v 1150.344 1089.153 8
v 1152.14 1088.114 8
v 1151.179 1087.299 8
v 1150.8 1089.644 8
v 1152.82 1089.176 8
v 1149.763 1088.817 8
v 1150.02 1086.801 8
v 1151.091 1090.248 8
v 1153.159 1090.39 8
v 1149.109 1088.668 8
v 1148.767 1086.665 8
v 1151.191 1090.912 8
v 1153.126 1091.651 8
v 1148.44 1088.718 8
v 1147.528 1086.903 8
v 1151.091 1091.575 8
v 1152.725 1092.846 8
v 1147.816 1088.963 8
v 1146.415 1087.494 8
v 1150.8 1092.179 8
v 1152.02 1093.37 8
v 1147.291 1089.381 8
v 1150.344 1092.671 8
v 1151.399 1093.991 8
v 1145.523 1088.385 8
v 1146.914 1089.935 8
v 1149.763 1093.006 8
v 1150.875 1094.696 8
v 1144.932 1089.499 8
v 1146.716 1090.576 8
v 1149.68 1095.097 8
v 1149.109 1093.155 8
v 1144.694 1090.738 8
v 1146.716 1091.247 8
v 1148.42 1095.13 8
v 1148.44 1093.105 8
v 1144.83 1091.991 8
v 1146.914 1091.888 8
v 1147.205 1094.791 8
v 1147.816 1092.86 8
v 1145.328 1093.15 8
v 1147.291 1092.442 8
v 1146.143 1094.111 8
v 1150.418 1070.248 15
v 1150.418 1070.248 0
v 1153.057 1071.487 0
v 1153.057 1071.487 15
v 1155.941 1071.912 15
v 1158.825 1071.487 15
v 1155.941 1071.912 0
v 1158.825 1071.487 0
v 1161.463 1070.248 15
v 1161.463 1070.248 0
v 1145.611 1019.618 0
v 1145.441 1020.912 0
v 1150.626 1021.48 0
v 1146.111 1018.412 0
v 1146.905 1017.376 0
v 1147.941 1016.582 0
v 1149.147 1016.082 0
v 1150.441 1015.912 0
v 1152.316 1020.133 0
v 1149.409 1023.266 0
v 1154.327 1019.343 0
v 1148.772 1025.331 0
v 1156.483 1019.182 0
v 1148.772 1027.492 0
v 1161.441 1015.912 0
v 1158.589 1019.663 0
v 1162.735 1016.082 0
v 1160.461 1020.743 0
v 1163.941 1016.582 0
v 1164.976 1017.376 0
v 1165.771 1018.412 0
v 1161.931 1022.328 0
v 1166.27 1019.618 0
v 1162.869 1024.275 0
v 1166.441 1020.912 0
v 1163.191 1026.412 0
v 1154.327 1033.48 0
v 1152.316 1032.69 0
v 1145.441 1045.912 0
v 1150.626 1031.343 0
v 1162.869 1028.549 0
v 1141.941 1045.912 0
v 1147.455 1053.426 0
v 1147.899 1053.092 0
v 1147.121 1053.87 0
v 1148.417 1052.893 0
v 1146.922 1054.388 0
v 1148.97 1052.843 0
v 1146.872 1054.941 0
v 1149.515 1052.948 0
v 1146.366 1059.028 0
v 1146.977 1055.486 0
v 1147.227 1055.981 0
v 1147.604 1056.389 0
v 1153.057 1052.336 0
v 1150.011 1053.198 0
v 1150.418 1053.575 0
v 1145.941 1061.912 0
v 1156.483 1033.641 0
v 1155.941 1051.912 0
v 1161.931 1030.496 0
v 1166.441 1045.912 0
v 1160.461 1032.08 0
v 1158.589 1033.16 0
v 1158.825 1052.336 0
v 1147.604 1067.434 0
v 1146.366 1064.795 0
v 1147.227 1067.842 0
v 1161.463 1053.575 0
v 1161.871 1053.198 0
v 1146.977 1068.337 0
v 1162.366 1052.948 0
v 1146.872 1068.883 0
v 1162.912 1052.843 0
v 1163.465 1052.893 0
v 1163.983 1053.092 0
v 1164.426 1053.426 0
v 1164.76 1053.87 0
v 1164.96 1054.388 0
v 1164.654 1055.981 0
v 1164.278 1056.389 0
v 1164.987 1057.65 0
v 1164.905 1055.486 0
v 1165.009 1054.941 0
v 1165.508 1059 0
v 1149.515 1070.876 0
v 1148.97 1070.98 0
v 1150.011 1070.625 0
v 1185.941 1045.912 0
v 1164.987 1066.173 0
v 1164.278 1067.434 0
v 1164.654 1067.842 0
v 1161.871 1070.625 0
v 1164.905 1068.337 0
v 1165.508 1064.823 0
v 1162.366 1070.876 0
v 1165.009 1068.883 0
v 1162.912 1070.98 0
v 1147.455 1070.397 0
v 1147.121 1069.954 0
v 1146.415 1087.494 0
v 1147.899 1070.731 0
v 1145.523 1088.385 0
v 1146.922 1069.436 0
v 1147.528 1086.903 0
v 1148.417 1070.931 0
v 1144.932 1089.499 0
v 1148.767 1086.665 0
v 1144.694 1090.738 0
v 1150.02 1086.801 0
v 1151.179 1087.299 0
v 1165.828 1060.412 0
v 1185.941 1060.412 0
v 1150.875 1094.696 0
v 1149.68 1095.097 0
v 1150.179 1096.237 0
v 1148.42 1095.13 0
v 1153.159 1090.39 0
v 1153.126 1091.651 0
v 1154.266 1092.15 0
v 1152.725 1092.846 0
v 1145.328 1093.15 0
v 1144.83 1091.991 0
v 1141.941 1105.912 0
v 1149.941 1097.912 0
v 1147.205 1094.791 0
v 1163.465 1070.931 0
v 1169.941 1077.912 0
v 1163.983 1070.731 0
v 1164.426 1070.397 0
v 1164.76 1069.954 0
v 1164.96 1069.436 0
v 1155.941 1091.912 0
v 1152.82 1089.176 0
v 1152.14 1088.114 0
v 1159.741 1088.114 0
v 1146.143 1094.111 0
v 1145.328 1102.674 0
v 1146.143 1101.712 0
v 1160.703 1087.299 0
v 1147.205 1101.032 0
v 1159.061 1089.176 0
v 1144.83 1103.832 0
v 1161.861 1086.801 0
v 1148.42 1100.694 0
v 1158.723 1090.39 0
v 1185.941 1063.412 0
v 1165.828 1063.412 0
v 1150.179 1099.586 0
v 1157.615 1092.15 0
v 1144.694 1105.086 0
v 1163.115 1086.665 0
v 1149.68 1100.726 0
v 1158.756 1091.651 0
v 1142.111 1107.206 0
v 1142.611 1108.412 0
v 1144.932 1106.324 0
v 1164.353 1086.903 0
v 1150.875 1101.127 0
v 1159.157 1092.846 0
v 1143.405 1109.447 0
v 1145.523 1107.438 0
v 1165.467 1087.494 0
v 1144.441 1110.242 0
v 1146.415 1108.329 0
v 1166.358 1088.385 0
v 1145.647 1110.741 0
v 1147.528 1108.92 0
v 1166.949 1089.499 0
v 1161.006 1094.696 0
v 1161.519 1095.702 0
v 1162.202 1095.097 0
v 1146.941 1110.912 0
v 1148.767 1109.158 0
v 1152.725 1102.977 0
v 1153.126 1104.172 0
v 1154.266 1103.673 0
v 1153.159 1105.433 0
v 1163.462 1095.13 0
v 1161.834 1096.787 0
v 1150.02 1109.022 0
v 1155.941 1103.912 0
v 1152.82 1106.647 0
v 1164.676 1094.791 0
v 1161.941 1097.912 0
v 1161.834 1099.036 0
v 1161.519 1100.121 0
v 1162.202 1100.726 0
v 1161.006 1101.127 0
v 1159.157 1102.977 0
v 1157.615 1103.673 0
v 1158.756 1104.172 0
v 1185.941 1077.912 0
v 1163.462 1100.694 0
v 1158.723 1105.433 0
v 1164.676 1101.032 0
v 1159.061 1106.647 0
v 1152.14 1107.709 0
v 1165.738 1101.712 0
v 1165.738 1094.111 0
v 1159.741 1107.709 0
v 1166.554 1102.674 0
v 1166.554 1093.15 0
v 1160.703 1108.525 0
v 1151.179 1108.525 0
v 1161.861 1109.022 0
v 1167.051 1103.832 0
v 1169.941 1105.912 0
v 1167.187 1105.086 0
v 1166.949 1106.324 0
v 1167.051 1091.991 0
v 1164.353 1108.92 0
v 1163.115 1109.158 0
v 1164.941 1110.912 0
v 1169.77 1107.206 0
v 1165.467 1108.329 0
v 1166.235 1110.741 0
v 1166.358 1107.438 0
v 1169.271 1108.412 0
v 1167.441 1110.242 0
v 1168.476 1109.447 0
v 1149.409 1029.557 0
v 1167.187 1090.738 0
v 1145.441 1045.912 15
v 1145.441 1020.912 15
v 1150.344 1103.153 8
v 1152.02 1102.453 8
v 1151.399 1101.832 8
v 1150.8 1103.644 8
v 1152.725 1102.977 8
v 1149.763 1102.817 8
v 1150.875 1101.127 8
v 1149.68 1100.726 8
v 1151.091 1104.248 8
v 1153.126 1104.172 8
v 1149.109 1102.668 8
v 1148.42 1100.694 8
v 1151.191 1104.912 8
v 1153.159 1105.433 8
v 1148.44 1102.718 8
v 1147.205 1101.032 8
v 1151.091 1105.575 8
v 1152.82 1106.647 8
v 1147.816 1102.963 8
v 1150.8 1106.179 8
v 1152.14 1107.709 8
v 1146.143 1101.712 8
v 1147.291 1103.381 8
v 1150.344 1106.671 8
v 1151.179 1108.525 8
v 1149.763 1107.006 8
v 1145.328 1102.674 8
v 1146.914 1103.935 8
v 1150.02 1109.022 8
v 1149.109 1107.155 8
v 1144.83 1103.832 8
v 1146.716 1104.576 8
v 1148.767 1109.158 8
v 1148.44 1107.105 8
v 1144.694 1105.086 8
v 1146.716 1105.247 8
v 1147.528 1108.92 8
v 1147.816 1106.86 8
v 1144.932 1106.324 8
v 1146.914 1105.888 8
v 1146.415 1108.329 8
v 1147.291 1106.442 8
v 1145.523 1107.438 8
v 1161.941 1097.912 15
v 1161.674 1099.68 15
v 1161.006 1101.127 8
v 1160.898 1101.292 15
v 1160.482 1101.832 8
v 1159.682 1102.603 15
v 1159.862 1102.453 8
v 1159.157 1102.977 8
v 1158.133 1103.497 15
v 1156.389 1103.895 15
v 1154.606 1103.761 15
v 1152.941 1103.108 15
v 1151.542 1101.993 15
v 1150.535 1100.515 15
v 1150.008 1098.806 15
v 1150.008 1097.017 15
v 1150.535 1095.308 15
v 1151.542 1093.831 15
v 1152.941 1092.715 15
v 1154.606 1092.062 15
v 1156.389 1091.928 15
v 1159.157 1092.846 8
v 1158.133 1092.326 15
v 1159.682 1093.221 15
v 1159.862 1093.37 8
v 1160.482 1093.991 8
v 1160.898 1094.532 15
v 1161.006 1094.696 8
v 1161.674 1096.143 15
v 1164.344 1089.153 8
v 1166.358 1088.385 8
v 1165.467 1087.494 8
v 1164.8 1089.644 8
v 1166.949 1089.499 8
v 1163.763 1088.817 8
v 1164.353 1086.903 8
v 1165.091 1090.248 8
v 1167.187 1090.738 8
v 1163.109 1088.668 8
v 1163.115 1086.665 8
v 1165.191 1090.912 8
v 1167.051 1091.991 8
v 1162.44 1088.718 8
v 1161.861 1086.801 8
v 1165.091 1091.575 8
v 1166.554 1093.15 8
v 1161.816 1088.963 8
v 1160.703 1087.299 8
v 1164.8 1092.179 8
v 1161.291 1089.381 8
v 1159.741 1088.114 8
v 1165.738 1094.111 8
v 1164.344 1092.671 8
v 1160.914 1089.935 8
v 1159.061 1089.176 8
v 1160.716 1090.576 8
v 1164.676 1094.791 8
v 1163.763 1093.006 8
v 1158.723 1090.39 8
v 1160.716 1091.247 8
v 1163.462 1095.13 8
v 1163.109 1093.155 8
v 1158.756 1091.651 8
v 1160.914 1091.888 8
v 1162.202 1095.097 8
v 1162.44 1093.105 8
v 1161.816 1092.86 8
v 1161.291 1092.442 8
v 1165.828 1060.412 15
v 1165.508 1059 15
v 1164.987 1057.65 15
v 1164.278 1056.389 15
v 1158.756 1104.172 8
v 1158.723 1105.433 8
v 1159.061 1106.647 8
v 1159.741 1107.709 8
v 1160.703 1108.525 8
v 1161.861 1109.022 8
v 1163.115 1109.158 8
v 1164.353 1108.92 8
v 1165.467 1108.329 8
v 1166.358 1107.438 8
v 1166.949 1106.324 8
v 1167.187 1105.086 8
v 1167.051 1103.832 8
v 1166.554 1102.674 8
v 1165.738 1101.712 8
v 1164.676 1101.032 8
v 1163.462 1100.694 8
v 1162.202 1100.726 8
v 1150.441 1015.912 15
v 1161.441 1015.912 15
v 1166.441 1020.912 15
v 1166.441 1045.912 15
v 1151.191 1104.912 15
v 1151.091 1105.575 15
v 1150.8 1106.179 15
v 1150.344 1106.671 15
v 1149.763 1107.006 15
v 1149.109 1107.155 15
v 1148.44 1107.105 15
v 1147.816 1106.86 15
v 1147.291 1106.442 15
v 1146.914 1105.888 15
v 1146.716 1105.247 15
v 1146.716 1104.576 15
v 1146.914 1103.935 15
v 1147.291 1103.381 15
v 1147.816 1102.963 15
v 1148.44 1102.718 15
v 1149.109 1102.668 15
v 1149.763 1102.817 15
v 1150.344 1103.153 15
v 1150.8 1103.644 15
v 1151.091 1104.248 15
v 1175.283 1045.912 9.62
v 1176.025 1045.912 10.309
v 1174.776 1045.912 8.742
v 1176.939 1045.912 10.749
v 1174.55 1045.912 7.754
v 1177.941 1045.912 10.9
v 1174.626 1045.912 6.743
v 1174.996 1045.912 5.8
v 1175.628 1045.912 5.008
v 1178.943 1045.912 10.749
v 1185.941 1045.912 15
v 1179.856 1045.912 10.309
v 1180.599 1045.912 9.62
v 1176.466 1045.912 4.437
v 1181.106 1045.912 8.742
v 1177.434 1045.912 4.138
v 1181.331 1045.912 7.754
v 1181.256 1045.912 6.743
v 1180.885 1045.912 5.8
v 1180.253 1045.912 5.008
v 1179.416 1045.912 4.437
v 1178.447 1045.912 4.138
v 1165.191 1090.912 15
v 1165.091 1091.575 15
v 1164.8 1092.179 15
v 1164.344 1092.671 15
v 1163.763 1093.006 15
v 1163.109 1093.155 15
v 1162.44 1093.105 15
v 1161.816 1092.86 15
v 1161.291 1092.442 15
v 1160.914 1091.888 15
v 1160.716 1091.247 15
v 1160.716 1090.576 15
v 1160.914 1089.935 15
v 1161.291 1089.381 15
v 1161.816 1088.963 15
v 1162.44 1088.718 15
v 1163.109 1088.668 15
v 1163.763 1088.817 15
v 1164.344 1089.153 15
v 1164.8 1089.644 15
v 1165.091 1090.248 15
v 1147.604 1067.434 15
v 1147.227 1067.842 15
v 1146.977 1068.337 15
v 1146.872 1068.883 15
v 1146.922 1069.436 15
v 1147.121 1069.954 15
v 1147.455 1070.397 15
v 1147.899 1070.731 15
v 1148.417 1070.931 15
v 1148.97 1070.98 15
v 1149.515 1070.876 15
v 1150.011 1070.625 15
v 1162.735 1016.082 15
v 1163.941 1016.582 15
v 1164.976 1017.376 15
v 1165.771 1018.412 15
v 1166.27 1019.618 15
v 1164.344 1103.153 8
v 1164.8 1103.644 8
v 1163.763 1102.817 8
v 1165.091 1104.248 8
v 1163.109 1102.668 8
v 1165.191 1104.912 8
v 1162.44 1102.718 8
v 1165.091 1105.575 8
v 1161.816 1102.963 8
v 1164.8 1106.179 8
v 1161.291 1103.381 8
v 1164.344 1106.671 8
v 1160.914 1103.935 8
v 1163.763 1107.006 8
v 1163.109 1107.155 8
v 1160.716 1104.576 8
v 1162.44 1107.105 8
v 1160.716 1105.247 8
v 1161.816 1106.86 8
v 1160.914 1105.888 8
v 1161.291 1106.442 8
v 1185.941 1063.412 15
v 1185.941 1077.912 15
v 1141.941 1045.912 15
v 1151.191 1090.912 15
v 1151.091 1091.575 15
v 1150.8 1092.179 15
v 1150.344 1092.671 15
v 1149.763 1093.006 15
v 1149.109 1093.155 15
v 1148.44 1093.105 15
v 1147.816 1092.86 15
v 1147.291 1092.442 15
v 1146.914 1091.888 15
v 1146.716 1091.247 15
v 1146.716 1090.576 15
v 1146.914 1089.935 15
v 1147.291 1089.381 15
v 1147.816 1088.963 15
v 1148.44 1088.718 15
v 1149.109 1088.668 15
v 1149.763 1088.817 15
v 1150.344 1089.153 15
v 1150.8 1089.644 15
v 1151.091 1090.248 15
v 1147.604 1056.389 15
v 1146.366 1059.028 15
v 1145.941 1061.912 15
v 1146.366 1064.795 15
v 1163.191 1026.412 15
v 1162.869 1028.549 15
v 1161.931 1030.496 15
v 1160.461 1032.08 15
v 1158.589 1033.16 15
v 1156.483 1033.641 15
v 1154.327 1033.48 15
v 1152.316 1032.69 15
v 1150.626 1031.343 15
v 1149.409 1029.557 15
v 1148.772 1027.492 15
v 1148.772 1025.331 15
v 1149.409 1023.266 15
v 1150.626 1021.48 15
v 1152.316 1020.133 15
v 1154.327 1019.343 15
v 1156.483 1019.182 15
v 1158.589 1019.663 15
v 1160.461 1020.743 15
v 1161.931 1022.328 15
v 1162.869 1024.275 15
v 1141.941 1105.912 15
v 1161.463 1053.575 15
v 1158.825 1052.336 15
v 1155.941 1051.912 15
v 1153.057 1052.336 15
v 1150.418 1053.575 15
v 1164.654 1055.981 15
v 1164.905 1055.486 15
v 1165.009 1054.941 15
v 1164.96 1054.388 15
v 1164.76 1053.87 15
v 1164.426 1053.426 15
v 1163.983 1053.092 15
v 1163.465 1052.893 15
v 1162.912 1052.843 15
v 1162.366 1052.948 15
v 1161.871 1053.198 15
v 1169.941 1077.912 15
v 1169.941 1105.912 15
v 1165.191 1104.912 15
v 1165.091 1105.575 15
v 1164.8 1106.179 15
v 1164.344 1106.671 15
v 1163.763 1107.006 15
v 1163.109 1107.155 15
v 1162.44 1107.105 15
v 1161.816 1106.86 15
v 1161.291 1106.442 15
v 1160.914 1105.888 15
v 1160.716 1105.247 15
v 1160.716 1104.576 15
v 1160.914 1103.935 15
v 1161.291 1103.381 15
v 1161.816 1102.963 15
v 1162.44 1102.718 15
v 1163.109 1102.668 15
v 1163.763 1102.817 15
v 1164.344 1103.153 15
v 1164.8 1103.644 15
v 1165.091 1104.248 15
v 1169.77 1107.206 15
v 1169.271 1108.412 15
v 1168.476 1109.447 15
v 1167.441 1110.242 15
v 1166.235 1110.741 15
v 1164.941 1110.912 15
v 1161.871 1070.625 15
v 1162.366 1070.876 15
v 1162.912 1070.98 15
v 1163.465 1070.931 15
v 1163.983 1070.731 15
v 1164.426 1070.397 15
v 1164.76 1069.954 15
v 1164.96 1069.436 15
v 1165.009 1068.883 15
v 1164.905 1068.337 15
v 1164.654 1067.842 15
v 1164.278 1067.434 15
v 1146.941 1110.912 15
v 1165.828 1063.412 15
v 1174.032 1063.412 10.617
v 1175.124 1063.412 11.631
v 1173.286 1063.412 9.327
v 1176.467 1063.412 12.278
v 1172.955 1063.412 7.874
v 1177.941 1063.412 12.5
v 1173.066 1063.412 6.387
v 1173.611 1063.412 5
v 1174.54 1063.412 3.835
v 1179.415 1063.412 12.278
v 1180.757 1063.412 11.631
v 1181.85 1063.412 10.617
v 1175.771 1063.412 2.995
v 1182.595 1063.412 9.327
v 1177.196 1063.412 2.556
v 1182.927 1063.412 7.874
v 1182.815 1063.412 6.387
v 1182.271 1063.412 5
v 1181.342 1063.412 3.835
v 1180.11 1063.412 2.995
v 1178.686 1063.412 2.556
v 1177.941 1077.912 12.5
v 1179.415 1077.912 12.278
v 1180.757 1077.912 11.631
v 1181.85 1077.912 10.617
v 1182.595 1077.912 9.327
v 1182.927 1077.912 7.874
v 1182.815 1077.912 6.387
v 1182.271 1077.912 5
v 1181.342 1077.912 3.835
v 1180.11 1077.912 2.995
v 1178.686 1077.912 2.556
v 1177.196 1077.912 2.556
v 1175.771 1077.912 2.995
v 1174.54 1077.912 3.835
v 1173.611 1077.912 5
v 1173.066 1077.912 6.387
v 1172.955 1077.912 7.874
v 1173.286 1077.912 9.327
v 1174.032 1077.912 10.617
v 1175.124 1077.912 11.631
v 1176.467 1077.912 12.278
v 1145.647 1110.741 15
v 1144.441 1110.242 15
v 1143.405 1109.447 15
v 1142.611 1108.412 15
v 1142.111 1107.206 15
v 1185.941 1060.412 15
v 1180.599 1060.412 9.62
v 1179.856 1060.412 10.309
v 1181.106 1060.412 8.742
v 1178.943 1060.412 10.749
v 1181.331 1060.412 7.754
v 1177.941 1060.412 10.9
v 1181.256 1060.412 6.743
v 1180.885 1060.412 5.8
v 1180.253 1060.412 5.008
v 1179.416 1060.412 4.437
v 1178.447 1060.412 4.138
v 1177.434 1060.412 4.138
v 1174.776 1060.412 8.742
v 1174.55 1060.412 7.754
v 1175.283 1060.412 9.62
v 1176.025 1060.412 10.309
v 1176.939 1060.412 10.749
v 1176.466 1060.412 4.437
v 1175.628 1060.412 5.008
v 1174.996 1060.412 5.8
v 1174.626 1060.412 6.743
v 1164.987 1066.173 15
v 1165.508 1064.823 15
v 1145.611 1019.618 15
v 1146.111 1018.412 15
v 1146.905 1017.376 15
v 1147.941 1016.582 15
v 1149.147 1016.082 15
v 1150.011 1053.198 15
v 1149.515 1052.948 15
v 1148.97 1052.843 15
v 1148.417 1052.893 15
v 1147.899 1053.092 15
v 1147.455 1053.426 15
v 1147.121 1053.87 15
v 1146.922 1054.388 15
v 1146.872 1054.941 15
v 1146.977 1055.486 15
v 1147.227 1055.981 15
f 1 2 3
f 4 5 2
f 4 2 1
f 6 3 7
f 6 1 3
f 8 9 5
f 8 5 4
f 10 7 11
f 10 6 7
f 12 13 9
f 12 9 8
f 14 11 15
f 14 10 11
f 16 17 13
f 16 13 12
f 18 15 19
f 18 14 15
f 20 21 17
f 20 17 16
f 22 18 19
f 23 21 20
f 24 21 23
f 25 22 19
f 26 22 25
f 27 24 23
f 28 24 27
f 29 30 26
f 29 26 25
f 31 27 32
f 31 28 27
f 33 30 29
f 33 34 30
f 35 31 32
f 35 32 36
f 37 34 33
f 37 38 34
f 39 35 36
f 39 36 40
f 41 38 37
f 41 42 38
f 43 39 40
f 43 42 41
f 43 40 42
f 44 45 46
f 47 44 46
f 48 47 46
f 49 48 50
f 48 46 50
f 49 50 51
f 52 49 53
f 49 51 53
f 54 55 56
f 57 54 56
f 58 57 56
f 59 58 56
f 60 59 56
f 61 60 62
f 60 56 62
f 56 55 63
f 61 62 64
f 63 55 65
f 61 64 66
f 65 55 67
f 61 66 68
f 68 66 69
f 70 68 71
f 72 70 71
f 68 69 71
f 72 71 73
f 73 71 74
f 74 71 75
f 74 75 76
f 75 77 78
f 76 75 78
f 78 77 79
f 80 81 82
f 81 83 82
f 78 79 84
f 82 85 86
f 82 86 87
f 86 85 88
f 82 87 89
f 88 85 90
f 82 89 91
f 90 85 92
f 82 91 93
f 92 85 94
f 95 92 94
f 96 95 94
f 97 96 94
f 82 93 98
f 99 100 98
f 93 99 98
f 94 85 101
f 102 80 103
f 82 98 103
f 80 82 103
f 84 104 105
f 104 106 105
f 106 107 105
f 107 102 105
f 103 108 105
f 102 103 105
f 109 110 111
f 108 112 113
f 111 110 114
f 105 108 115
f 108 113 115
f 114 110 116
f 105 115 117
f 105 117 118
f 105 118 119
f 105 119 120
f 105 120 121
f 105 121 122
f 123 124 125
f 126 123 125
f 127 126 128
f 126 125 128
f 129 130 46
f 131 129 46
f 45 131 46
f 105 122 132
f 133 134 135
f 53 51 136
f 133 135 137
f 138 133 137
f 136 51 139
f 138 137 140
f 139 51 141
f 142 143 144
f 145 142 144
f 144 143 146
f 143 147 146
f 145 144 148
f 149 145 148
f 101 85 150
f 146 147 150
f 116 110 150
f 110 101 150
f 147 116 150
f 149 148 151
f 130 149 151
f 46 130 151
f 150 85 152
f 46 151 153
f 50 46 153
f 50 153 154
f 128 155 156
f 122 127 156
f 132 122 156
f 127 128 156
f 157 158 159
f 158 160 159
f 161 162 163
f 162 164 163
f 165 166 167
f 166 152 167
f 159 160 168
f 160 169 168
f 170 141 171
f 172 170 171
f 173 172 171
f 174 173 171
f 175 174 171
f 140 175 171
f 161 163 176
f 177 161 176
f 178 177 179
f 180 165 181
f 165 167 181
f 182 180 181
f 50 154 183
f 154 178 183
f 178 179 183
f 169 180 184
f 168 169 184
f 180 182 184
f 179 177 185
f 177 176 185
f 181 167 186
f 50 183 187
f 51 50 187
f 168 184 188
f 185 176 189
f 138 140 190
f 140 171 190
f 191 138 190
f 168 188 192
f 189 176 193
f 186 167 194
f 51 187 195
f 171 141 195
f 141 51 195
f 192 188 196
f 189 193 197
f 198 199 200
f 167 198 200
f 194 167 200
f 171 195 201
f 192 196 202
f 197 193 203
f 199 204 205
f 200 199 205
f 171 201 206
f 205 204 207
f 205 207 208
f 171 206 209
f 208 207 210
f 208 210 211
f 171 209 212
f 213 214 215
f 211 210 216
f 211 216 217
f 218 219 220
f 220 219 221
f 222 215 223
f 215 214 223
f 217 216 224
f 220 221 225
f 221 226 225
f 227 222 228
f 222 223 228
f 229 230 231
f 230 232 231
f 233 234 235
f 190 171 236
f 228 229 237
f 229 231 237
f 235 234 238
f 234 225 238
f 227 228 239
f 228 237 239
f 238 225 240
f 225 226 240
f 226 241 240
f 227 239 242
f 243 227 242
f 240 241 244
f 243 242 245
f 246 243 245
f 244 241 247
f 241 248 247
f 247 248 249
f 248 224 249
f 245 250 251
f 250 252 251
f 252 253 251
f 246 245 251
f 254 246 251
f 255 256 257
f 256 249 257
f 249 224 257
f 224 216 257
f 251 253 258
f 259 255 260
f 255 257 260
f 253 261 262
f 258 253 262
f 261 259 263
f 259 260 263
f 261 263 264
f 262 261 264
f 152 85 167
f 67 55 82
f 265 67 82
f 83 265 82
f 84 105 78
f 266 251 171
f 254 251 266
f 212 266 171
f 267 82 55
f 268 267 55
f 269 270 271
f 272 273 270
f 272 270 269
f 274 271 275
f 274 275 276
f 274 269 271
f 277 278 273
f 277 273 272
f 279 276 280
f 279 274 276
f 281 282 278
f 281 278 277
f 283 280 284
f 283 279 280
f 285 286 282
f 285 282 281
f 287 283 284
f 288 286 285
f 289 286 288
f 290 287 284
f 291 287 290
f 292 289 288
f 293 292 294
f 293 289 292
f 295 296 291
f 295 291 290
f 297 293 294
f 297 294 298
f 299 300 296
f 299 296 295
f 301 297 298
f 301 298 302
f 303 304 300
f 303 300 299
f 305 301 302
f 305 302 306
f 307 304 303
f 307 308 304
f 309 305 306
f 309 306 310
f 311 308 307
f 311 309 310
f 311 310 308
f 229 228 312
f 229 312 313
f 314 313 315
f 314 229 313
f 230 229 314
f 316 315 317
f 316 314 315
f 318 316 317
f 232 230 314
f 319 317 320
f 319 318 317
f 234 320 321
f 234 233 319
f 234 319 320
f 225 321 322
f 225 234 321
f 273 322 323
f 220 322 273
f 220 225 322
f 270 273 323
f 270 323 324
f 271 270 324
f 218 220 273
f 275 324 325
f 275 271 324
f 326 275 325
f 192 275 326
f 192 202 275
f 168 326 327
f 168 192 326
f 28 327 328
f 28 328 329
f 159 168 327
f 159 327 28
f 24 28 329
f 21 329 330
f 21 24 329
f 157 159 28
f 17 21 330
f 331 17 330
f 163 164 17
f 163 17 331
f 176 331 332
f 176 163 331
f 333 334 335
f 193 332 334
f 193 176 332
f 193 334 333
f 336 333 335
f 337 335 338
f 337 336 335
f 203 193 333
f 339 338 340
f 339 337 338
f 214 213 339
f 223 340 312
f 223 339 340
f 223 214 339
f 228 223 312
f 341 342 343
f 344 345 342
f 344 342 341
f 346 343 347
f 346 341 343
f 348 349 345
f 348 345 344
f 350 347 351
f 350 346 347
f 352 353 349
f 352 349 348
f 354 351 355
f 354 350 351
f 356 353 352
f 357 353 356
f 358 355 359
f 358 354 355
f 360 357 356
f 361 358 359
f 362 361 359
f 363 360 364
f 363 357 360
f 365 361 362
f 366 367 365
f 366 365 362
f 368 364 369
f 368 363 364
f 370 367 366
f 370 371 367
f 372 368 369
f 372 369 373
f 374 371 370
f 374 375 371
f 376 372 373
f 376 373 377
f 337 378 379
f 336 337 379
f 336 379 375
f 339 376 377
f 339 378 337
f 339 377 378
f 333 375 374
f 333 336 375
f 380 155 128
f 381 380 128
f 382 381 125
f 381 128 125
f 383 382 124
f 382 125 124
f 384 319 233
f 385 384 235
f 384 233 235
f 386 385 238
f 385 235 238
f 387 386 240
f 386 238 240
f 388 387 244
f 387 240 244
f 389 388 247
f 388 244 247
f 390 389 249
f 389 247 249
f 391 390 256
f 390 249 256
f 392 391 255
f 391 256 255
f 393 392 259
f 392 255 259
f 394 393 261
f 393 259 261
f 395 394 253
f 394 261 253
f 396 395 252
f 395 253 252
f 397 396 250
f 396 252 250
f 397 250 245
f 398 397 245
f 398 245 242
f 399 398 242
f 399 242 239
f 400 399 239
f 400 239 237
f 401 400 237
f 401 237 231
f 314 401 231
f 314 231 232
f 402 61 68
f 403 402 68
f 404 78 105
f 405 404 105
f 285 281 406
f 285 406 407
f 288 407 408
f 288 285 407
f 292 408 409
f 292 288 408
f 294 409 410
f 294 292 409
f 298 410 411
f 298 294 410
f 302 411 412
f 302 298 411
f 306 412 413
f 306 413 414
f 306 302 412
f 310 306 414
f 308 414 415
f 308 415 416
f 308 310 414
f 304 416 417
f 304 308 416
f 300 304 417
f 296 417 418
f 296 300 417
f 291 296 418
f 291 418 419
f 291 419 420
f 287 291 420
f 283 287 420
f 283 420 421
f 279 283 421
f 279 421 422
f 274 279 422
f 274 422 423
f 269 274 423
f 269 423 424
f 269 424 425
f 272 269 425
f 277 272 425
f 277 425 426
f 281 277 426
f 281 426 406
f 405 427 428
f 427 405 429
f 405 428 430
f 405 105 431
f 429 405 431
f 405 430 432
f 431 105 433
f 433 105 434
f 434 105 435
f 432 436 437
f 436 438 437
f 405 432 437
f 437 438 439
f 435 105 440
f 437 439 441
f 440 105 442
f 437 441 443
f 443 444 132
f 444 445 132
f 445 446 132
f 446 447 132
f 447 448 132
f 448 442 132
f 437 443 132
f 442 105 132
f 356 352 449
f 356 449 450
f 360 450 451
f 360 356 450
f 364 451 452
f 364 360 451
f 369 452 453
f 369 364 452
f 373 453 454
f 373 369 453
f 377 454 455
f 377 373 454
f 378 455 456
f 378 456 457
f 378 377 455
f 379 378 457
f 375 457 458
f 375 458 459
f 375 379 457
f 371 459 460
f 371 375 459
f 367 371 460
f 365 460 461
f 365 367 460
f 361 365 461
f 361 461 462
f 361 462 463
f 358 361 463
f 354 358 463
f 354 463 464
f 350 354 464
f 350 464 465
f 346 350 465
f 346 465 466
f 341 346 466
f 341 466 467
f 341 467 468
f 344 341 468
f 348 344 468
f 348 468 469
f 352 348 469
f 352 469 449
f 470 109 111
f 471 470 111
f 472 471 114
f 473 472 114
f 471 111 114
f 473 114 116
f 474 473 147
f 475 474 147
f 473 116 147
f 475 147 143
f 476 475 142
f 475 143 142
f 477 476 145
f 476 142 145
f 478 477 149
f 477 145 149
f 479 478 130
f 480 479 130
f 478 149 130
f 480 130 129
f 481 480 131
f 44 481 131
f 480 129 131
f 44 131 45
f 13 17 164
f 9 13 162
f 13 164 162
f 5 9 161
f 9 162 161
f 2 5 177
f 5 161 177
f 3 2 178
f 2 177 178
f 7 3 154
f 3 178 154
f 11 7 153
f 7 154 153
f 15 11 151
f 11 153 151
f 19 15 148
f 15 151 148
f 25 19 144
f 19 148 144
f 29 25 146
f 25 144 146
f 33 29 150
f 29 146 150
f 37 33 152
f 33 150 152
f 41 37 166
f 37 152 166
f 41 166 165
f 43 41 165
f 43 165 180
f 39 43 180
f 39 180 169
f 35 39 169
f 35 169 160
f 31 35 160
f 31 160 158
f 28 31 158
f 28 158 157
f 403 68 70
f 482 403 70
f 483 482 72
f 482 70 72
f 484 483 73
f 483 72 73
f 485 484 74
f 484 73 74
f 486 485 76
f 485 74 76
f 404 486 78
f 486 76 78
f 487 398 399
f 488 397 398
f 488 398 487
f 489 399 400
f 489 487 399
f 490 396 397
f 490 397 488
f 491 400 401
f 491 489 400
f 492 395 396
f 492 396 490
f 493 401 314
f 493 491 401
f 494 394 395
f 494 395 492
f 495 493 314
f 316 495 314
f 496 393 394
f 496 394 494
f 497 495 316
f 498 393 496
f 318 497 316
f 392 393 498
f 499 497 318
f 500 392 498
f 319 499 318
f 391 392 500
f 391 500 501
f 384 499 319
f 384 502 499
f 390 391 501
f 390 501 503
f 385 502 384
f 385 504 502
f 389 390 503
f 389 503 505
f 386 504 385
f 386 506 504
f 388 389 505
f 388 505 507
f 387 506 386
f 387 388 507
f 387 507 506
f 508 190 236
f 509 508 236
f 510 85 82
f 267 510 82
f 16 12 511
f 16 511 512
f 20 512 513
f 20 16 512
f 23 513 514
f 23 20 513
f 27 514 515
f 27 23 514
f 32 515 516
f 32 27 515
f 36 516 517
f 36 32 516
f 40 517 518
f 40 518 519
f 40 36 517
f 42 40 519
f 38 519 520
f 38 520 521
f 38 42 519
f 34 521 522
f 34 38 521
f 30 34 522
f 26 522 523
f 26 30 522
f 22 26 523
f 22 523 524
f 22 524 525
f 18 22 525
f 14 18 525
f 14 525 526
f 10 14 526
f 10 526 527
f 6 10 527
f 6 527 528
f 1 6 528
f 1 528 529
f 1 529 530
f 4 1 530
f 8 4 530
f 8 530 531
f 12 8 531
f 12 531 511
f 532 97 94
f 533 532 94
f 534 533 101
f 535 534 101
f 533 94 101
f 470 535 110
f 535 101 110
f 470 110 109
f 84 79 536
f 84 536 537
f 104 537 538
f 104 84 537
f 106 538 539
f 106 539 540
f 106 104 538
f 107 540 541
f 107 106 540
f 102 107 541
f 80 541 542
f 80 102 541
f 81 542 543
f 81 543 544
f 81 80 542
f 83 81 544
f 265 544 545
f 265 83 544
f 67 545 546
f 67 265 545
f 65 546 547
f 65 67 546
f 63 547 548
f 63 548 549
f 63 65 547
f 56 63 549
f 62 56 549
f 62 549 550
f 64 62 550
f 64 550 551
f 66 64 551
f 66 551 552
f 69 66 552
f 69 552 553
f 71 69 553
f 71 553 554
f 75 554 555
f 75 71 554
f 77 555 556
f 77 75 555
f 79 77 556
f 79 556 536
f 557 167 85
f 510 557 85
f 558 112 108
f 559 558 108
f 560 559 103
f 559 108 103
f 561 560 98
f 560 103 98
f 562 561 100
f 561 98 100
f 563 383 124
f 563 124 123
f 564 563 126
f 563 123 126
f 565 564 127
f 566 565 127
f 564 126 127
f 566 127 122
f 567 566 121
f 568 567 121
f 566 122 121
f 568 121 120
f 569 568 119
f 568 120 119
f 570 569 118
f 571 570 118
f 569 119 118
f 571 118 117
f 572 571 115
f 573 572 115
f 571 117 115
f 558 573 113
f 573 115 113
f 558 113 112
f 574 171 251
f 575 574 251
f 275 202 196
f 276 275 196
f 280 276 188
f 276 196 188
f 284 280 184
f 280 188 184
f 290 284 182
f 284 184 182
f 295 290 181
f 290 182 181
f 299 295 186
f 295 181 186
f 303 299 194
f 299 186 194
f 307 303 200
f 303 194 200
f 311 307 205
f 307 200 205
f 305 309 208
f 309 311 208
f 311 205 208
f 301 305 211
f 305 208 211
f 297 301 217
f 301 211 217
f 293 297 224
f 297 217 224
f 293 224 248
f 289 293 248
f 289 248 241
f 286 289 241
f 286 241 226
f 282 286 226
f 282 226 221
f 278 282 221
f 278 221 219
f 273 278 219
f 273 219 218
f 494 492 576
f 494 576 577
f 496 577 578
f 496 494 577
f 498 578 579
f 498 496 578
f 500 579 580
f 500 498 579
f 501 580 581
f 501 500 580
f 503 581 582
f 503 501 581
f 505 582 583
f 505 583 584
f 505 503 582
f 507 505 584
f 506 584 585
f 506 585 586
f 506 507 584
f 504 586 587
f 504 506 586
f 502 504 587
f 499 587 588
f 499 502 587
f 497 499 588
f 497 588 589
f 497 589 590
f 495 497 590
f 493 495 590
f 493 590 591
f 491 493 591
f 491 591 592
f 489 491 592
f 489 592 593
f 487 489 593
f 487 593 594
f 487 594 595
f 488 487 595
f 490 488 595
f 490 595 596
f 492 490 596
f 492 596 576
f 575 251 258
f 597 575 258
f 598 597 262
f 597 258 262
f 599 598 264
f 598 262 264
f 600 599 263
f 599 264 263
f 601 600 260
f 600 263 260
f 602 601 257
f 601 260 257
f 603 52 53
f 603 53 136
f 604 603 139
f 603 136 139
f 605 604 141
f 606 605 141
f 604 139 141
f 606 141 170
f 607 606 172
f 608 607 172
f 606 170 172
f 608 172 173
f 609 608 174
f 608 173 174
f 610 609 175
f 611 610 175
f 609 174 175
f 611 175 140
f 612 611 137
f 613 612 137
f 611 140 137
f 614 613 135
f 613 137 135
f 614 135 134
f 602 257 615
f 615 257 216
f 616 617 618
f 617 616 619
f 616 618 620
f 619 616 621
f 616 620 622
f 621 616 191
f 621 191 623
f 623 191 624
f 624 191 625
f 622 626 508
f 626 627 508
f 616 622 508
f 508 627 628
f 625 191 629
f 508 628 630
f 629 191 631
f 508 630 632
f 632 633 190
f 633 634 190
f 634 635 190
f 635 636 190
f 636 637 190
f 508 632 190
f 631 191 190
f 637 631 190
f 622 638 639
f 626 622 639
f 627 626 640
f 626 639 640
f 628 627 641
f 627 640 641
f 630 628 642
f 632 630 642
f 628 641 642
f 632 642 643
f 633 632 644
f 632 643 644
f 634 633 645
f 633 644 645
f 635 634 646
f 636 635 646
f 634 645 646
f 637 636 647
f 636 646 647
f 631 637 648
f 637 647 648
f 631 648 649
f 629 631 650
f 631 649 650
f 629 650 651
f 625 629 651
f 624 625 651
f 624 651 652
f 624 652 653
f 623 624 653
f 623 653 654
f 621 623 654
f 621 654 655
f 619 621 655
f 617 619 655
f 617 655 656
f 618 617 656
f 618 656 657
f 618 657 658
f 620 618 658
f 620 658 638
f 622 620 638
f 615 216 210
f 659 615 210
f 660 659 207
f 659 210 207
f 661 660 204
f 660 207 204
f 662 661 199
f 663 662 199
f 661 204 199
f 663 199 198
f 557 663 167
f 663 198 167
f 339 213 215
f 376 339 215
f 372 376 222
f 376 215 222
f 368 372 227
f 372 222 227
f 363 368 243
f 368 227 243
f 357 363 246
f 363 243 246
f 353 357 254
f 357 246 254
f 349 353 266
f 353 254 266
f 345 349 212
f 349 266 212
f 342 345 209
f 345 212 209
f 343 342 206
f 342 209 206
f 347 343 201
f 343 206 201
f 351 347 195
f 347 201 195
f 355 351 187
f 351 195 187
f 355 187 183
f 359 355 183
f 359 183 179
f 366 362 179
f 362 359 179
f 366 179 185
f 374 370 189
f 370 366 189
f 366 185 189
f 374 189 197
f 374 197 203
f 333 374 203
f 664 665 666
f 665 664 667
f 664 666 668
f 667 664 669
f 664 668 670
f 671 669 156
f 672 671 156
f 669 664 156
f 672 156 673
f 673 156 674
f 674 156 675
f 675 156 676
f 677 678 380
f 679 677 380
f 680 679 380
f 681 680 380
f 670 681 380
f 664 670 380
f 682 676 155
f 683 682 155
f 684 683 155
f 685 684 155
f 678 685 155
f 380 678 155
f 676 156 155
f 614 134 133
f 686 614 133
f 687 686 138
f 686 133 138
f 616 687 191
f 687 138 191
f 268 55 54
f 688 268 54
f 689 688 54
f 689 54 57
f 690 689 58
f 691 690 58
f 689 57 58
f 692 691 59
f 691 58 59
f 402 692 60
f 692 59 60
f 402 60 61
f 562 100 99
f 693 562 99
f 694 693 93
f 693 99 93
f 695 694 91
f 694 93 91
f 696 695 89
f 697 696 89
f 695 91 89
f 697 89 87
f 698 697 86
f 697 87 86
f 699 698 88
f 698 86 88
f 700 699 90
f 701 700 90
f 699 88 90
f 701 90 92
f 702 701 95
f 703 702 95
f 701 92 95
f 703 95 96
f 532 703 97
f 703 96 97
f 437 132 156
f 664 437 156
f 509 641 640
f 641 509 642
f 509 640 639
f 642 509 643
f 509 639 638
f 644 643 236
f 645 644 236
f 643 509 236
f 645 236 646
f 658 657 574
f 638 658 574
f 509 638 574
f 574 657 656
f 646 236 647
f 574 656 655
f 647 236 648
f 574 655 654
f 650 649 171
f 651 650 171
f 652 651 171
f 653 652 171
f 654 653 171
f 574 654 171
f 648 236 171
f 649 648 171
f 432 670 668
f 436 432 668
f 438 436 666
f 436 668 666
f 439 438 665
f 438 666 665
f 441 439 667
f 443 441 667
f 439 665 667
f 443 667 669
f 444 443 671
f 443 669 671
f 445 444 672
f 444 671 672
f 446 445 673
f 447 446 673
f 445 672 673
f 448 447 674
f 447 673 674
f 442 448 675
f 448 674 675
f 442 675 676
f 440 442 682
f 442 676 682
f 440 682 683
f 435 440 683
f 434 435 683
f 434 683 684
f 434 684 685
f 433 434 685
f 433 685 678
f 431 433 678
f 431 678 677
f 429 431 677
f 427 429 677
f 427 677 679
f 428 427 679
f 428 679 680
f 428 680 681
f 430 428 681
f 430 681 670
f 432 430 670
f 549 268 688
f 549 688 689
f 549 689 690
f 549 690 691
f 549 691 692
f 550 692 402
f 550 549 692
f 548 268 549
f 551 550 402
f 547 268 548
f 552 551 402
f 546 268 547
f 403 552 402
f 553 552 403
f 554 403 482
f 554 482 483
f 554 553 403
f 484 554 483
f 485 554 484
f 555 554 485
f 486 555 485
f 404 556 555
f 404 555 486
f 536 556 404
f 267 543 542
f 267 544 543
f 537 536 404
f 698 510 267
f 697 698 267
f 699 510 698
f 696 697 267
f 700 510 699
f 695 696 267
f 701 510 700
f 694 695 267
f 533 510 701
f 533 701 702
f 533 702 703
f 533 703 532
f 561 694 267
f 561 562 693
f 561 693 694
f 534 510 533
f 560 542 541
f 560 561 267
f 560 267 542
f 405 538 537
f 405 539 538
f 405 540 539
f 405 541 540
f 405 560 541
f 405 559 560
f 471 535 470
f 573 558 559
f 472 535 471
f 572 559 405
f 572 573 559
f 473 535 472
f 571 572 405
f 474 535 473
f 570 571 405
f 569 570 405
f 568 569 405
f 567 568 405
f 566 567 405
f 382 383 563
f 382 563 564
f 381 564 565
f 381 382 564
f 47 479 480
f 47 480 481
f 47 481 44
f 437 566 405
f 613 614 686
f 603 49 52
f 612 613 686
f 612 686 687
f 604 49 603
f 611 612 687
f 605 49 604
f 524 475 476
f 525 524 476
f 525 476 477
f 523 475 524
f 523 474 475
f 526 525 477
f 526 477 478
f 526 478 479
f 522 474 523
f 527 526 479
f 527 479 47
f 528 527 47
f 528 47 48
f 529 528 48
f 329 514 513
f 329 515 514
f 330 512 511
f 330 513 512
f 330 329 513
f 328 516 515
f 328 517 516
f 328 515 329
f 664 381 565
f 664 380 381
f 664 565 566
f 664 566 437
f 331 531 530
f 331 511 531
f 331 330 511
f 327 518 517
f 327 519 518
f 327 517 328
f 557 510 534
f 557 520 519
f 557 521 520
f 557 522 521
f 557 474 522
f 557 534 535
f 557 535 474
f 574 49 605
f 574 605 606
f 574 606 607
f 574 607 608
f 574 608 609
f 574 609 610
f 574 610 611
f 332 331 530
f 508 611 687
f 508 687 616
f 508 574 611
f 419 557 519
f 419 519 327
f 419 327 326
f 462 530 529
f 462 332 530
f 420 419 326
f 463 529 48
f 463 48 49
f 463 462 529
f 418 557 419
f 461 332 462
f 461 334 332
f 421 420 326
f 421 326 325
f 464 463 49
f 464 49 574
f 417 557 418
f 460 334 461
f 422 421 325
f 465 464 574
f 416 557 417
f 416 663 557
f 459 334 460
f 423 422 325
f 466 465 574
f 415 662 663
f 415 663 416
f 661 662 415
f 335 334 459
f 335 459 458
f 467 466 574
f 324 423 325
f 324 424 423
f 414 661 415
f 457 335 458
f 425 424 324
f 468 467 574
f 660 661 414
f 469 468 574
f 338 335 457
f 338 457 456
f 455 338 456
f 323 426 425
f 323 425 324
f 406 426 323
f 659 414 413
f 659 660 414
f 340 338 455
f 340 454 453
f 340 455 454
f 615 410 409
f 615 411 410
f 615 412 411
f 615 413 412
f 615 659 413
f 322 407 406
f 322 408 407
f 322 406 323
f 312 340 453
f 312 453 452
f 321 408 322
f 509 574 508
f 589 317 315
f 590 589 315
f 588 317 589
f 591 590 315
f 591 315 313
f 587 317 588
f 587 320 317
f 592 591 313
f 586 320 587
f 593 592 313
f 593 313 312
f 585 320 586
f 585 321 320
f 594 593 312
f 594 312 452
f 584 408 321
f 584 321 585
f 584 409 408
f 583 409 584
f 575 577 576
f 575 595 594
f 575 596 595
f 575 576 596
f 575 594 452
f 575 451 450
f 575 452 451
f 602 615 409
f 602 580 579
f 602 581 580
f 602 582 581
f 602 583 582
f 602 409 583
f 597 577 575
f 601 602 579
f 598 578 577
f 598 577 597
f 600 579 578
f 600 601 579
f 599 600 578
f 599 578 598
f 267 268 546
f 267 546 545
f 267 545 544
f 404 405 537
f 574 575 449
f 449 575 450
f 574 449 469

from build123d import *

# Parameters (mm, degrees)
SKETCH_1_R          = 2.25
SKETCH_1_R_2        = 6
SKETCH_1_R_3        = 7.25
EXTRUDE_1_DEPTH     = 15
SKETCH_2_R          = 4.25
CUT_EXTRUDE_2_DEPTH = 8
SKETCH_3_R          = 3.4
CUT_EXTRUDE_3_DEPTH = 1188.655030604
SKETCH_4_R          = 5
CUT_EXTRUDE_4_DEPTH = 15


with BuildPart() as part:
    # 草图1 → 拉伸1 (new body)
    with BuildSketch(Plane.XY):
        with BuildLine():
            Line((1164.940753882, 1110.911631895), (1146.940753882, 1110.911631895))
            ThreePointArc((1146.940753882, 1110.911631895), (1143.405219976, 1109.4471658), (1141.940753882, 1105.911631895))
            Line((1141.940753882, 1105.911631895), (1141.940753882, 1045.911631895))
            Line((1141.940753882, 1045.911631895), (1145.440753882, 1045.911631895))
            Line((1145.440753882, 1045.911631895), (1145.440753882, 1020.911631895))
            ThreePointArc((1145.440753882, 1020.911631895), (1146.905219976, 1017.376097989), (1150.440753882, 1015.911631895))
            Line((1150.440753882, 1015.911631895), (1161.440753882, 1015.911631895))
            ThreePointArc((1161.440753882, 1015.911631895), (1164.976287788, 1017.376097989), (1166.440753882, 1020.911631895))
            Line((1166.440753882, 1020.911631895), (1166.440753882, 1045.911631895))
            Line((1166.440753882, 1045.911631895), (1185.940753882, 1045.911631895))
            Line((1185.940753882, 1045.911631895), (1185.940753882, 1060.411631895))
            Line((1185.940753882, 1060.411631895), (1165.827613848, 1060.411631895))
            ThreePointArc((1165.827613848, 1060.411631895), (1165.271903508, 1058.315850107), (1164.277525065, 1056.389110167))
            ThreePointArc((1164.277525065, 1056.389110167), (1164.426035256, 1053.42635052), (1161.46327561, 1053.574860711))
            ThreePointArc((1161.46327561, 1053.574860711), (1155.940753882, 1051.911631895), (1150.418232154, 1053.574860711))
            ThreePointArc((1150.418232154, 1053.574860711), (1147.455472508, 1053.42635052), (1147.603982698, 1056.389110167))
            ThreePointArc((1147.603982698, 1056.389110167), (1145.940753882, 1061.911631895), (1147.603982698, 1067.434153622))
            ThreePointArc((1147.603982698, 1067.434153622), (1147.455472508, 1070.396913269), (1150.418232154, 1070.248403078))
            ThreePointArc((1150.418232154, 1070.248403078), (1155.940753882, 1071.911631895), (1161.46327561, 1070.248403078))
            ThreePointArc((1161.46327561, 1070.248403078), (1164.426035256, 1070.396913269), (1164.277525065, 1067.434153622))
            ThreePointArc((1164.277525065, 1067.434153622), (1165.271903508, 1065.507413682), (1165.827613848, 1063.411631895))
            Line((1165.827613848, 1063.411631895), (1185.940753882, 1063.411631895))
            Line((1185.940753882, 1063.411631895), (1185.940753882, 1077.911631895))
            Line((1185.940753882, 1077.911631895), (1169.940753882, 1077.911631895))
            Line((1169.940753882, 1077.911631895), (1169.940753882, 1105.911631895))
            ThreePointArc((1169.940753882, 1105.911631895), (1168.476287788, 1109.4471658), (1164.940753882, 1110.911631895))
        make_face()
        with Locations((1162.940753882, 1104.911631895)):
            Circle(SKETCH_1_R, mode=Mode.SUBTRACT)
        with Locations((1155.940753882, 1097.911631895)):
            Circle(SKETCH_1_R_2, mode=Mode.SUBTRACT)
        with Locations((1148.940753882, 1104.911631895)):
            Circle(SKETCH_1_R, mode=Mode.SUBTRACT)
        with Locations((1148.940753882, 1090.911631895)):
            Circle(SKETCH_1_R, mode=Mode.SUBTRACT)
        with Locations((1162.940753882, 1090.911631895)):
            Circle(SKETCH_1_R, mode=Mode.SUBTRACT)
        with Locations((1155.940753882, 1026.411631895)):
            Circle(SKETCH_1_R_3, mode=Mode.SUBTRACT)
    extrude(amount=EXTRUDE_1_DEPTH)

    # 草图2 → 拉伸2 (cut)
    with BuildSketch(Plane(origin=(0, 0, 0), x_dir=(-1, 0, 0), z_dir=(0, 0, -1))):
        with Locations((-1148.940753882, 1090.911631895)):
            Circle(SKETCH_2_R)
        with Locations((-1162.940753882, 1090.911631895)):
            Circle(SKETCH_2_R)
        with Locations((-1148.940753882, 1104.911631895)):
            Circle(SKETCH_2_R)
        with Locations((-1162.940753882, 1104.911631895)):
            Circle(SKETCH_2_R)
    extrude(amount=-CUT_EXTRUDE_2_DEPTH, mode=Mode.SUBTRACT)

    # 草图3 → 拉伸3 (cut, through all)
    with BuildSketch(Plane(origin=(0, 1077.911631895, 0), x_dir=(1, 0, 0), z_dir=(0, 1, 0))):
        with Locations(Location((1177.940753882, -7.5, 0), (0, 0, 270))):
            Circle(SKETCH_3_R)
    extrude(amount=-CUT_EXTRUDE_3_DEPTH, mode=Mode.SUBTRACT)

    # 草图4 → 拉伸4 (cut)
    with BuildSketch(Plane(origin=(0, 1077.911631895, 0), x_dir=(1, 0, 0), z_dir=(0, 1, 0))):
        with Locations(Location((1177.940753882, -7.5, 0), (0, 0, 270))):
            Circle(SKETCH_4_R)
    extrude(amount=-CUT_EXTRUDE_4_DEPTH, mode=Mode.SUBTRACT)


solid = part.part
